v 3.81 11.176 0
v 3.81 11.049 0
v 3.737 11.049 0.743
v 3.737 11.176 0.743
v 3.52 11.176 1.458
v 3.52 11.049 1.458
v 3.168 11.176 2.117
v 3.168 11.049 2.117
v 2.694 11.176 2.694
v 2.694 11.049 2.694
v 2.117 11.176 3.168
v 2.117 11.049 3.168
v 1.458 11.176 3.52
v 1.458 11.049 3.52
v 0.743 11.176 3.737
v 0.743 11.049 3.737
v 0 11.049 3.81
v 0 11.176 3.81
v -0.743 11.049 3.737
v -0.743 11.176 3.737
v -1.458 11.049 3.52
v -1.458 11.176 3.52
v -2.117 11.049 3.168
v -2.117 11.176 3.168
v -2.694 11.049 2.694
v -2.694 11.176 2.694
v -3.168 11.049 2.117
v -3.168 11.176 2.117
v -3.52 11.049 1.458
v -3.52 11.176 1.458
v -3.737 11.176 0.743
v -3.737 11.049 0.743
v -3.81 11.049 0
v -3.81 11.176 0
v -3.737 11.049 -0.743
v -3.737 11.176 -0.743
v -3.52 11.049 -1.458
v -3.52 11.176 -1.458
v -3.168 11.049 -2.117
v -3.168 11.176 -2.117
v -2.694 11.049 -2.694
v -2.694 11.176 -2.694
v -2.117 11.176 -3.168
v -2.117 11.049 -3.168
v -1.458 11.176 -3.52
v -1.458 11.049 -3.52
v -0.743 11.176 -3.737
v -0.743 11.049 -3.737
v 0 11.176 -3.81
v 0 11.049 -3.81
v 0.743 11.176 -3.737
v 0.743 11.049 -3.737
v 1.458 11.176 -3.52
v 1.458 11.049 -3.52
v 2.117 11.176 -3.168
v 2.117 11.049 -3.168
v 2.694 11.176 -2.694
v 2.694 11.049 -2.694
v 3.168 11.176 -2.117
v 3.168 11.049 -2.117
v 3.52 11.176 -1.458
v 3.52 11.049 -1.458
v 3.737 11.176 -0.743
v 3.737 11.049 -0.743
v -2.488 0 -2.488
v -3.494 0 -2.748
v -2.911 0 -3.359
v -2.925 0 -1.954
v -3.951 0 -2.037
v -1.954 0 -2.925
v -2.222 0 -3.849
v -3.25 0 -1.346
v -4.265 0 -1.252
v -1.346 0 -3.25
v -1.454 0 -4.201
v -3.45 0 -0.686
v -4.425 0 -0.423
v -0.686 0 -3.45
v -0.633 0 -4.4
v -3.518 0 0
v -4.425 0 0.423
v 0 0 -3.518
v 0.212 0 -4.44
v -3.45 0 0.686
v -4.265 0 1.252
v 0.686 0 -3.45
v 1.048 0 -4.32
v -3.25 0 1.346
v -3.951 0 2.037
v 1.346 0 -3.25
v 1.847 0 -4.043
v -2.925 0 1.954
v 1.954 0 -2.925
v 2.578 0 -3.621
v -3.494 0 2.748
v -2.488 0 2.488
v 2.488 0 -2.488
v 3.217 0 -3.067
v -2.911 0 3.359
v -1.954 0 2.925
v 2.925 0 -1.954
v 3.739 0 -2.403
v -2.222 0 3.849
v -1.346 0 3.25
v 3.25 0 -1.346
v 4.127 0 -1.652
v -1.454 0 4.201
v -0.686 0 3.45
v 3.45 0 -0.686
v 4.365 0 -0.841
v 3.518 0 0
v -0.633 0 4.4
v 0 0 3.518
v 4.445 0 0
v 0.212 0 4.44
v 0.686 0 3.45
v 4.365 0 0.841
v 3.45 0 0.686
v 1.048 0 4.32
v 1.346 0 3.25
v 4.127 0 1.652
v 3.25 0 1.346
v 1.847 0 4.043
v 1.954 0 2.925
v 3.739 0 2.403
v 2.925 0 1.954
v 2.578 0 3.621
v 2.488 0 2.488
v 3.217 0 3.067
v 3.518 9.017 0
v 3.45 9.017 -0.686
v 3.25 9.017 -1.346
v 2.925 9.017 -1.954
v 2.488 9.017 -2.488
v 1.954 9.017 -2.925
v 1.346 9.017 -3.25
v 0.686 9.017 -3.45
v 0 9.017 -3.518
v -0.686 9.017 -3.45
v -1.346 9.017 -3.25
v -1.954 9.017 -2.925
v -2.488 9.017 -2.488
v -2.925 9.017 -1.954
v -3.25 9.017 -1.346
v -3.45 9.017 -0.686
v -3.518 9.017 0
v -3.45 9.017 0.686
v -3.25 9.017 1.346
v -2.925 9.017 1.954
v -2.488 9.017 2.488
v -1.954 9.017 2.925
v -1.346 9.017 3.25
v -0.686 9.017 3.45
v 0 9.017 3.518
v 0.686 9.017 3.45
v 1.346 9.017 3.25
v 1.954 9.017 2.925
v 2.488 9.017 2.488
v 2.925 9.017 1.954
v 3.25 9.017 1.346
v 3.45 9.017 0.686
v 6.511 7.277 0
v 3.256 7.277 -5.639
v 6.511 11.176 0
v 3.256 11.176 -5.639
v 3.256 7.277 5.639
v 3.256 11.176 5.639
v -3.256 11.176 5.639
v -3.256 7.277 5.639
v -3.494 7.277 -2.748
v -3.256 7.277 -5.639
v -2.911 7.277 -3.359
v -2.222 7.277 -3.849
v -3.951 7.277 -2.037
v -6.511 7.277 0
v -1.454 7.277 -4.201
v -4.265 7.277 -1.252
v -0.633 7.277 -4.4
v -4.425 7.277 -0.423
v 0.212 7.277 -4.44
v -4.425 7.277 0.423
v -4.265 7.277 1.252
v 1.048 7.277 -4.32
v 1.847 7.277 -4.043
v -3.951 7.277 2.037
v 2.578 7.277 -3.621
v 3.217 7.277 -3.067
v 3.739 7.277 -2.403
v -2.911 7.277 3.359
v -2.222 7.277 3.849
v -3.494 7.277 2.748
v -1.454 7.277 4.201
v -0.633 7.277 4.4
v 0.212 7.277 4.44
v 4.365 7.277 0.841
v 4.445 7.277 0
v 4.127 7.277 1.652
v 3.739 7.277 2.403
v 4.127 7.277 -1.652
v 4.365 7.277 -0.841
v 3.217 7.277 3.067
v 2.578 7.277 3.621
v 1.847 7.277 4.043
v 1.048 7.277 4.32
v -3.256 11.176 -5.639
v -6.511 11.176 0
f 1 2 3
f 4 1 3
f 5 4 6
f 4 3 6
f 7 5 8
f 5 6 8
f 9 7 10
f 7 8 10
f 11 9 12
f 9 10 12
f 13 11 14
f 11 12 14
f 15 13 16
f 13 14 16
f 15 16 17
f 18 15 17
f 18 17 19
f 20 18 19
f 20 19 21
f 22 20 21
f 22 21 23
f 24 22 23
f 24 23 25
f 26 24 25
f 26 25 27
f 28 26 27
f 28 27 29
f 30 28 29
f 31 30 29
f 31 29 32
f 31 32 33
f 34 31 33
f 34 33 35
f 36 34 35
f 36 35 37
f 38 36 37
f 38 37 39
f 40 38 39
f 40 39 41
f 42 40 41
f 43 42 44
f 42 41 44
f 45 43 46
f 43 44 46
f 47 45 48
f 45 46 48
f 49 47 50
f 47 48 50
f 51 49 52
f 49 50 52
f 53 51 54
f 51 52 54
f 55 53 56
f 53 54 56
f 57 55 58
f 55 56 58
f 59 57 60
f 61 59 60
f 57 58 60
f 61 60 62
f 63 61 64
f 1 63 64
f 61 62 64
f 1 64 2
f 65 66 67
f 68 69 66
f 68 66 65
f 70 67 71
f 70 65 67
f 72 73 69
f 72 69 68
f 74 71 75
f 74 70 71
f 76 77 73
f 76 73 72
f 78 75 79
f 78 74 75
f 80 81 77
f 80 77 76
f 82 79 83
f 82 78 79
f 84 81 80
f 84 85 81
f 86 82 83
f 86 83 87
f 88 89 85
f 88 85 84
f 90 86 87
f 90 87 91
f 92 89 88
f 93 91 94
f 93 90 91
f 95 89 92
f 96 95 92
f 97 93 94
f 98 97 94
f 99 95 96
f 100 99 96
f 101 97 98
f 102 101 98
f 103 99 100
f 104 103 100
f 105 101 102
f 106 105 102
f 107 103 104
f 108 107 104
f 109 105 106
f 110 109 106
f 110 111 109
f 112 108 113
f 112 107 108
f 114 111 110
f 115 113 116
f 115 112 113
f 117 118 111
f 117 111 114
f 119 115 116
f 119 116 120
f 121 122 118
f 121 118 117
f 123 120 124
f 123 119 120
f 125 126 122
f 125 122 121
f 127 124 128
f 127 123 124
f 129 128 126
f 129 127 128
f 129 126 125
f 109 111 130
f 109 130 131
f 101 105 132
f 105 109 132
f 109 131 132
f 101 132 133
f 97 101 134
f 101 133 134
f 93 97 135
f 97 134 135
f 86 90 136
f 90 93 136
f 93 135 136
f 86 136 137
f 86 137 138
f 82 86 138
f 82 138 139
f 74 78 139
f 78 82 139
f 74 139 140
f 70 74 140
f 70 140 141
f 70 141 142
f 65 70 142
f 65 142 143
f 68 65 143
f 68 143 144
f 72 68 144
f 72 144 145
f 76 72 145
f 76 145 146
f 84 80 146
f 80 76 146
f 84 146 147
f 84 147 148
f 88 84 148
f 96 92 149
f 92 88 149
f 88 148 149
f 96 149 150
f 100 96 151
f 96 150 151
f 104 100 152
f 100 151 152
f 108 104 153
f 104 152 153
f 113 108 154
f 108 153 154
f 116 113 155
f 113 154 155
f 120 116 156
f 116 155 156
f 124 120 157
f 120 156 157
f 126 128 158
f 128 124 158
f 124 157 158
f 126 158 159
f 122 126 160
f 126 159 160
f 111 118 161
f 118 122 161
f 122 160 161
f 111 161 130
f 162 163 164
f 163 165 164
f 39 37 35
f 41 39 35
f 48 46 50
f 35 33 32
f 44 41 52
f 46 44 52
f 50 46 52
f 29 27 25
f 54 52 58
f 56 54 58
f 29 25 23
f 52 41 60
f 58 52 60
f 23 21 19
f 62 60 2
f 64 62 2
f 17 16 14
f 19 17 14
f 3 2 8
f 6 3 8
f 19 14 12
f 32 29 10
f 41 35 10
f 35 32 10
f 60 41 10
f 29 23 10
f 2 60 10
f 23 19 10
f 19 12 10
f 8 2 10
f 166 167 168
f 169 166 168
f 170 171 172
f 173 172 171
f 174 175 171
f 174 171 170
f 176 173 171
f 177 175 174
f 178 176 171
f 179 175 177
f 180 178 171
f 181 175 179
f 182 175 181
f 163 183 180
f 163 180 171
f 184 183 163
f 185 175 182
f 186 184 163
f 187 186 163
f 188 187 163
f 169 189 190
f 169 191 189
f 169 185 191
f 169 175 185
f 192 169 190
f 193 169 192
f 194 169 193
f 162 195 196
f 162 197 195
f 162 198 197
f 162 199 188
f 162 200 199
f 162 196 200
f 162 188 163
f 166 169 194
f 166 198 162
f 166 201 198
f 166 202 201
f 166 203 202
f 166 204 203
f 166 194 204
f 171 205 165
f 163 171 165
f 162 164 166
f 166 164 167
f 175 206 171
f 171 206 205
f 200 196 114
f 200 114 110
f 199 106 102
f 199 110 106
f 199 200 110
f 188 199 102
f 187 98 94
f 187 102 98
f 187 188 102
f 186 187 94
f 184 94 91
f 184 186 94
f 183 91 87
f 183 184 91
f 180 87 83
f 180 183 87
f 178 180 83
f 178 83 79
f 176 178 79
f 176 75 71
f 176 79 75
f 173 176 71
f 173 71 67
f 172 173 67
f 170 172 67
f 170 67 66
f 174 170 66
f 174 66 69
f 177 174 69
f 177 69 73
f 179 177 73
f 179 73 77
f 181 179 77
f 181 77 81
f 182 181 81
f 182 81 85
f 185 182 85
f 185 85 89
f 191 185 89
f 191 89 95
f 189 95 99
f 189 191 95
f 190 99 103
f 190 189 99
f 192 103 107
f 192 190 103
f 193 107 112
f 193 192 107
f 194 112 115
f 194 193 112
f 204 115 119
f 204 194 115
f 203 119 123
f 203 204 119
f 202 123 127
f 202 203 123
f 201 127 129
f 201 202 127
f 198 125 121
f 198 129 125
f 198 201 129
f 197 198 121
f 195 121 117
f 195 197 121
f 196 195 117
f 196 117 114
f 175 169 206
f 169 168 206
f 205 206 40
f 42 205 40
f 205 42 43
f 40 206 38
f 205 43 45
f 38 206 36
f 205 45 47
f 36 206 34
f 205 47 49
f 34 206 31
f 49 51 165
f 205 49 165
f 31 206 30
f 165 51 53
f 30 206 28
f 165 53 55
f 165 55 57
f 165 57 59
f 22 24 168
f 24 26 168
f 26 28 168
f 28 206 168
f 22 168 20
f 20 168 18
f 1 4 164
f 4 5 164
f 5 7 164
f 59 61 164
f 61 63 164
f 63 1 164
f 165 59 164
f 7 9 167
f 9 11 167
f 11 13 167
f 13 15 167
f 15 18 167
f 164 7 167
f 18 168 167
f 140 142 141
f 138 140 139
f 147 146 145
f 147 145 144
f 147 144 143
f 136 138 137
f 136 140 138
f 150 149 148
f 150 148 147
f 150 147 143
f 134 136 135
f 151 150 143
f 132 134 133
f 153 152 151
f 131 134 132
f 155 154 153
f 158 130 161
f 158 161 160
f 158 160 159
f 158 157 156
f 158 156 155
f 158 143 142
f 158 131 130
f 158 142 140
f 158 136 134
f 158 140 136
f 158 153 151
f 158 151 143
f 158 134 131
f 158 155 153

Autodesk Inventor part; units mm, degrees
ref_plane "YZ Plane" through (0, 0, 0) normal (1, 0, 0) x (0, 1, 0)
ref_plane "XZ Plane" through (0, 0, 0) normal (0, 1, 0) x (-1, 0, 0)
ref_plane "XY Plane" through (0, 0, 0) normal (0, 0, 1) x (1, 0, 0)
sketch "Sketch1" plane through (0, 0, 0) normal (0, 0, 1) x (1, 0, 0)
  line L0 (0, 0) -> (4.445, 0)
  line L1 (4.445, 0) -> (4.445, 7.2771)
  line L2 (4.445, 7.2771) -> (6.5111, 7.2771)
  line L3 (6.5111, 7.2771) -> (6.5111, 11.176)
  line L4 (6.5111, 11.176) -> (0, 11.176)
  line L5 (0, 11.176) -> (0, 0)
  line L6 (6.5111, 11.176) -> (3.2556, 5.5372) construction
  line L7 (3.2556, 5.5372) -> (-3.2556, 5.5372) construction
  line L8 (-3.2556, 5.5372) -> (-6.5111, 11.176) construction
  line L9 (-6.5111, 11.176) -> (-3.2556, 16.8148) construction
  line L10 (-3.2556, 16.8148) -> (3.2556, 16.8148) construction
  line L11 (3.2556, 16.8148) -> (6.5111, 11.176) construction
  line L12 (3.81, 11.176) -> (3.81, 11.049)
  line L13 (3.81, 11.049) -> (0, 11.049)
  line L14 (3.5179, 0) -> (3.5179, 9.017)
  line L15 (3.5179, 9.017) -> (0, 9.017)
  dimension "d0" = 8.89
  dimension "d2" = 3.8989
  dimension "d3" = 11.2776
  dimension "d7" = 11.176
  dimension "d8" = 7.62
  dimension "d9" = 0.127
  dimension "d10" = 7.0358
  dimension "d11" = 9.017
revolve "Revolution1" add sketch "Sketch1" angle 360 about axis through (0, 11.176, 0) along (0, -1, 0) contours L14 L15 L5 L13 L12 L4 L3 L2 L1 L0
sketch "Sketch2" plane through (0, 11.176, 0) normal (0, 1, 0) x (1, 0, 0)
  line L0 (6.5111, 0) -> (3.2556, -5.6388)
  line L1 (3.2556, -5.6388) -> (-3.2556, -5.6388)
  line L2 (-3.2556, -5.6388) -> (-6.5111, 0)
  line L3 (-6.5111, 0) -> (-3.2556, 5.6388)
  line L4 (-3.2556, 5.6388) -> (3.2556, 5.6388)
  line L5 (3.2556, 5.6388) -> (6.5111, 0)
  circle A0 centre (0, 0) radius 6.5111 projected
extrude "Extrusion1" cut sketch "Sketch2" against normal through all contours A0 L0 | L5 A0 | A0 L1 | L4 A0 | A0 L2 | L3 A0
thread "Thread1" size "1/8" designation "1/8 - 27 NPT" standard "NPT" length 9.9568
properties part number "9833K21" material "BRONZE, SAE 841"
